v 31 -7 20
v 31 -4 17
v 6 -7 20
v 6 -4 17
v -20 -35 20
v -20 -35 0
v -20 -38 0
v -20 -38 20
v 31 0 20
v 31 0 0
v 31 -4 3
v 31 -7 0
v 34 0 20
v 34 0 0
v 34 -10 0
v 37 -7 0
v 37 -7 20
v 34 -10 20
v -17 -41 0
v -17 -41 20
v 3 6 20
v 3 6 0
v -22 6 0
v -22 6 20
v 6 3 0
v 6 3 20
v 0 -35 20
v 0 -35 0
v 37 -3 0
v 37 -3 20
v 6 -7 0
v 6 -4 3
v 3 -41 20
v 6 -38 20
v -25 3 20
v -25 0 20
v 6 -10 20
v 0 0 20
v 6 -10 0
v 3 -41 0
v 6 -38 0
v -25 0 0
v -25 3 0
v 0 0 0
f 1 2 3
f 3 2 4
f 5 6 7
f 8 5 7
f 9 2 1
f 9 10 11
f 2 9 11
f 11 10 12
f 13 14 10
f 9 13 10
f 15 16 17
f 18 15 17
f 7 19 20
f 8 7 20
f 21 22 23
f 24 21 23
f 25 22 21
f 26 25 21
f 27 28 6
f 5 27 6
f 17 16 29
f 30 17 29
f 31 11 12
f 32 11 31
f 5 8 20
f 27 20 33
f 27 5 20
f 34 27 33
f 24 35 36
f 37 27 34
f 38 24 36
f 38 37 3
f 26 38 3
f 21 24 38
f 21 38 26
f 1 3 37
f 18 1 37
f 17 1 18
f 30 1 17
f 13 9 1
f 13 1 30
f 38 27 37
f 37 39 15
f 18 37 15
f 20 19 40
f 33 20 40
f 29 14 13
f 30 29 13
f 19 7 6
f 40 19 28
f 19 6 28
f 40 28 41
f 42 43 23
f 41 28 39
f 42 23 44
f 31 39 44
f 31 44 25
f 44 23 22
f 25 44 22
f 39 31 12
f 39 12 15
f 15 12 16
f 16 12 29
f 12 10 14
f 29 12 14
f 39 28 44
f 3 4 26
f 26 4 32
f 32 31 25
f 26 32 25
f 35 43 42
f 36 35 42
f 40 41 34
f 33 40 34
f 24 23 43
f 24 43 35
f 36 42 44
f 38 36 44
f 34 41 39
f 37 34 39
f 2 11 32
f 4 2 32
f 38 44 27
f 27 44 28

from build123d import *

# Parameters (mm, degrees)
F1_DEPTH = 20
F2_SIZE  = 3
F3_SIZE  = 3


with BuildPart() as f1:
    # F0 (on Top) → F1 (new body)
    with BuildSketch(Plane.XY):
        Polygon((-25, 6), (-25, 0), (0, 0), (0, -35), (-20, -35), (-20, -41), (6, -41), (6, -10), (37, -10), (37, 0), (31, 0), (31, -4), (6, -4), (6, 6), align=None)
    extrude(amount=F1_DEPTH)

    # F2
    f2_edges = [f1.edges().sort_by_distance(p)[0] for p in [
        (37, -10, 10),
        (6, 6, 10),
        (6, -41, 10),
        (-25, 6, 10),
        (-20, -41, 10),
        (37, 0, 10),
    ]]
    chamfer(f2_edges, length=F2_SIZE)

    # F3
    f3_edges = [f1.edges().sort_by_distance(p)[0] for p in [
        (18.5, -4, 20),
        (18.5, -4, 0),
    ]]
    chamfer(f3_edges, length=F3_SIZE)


solid = f1.part
